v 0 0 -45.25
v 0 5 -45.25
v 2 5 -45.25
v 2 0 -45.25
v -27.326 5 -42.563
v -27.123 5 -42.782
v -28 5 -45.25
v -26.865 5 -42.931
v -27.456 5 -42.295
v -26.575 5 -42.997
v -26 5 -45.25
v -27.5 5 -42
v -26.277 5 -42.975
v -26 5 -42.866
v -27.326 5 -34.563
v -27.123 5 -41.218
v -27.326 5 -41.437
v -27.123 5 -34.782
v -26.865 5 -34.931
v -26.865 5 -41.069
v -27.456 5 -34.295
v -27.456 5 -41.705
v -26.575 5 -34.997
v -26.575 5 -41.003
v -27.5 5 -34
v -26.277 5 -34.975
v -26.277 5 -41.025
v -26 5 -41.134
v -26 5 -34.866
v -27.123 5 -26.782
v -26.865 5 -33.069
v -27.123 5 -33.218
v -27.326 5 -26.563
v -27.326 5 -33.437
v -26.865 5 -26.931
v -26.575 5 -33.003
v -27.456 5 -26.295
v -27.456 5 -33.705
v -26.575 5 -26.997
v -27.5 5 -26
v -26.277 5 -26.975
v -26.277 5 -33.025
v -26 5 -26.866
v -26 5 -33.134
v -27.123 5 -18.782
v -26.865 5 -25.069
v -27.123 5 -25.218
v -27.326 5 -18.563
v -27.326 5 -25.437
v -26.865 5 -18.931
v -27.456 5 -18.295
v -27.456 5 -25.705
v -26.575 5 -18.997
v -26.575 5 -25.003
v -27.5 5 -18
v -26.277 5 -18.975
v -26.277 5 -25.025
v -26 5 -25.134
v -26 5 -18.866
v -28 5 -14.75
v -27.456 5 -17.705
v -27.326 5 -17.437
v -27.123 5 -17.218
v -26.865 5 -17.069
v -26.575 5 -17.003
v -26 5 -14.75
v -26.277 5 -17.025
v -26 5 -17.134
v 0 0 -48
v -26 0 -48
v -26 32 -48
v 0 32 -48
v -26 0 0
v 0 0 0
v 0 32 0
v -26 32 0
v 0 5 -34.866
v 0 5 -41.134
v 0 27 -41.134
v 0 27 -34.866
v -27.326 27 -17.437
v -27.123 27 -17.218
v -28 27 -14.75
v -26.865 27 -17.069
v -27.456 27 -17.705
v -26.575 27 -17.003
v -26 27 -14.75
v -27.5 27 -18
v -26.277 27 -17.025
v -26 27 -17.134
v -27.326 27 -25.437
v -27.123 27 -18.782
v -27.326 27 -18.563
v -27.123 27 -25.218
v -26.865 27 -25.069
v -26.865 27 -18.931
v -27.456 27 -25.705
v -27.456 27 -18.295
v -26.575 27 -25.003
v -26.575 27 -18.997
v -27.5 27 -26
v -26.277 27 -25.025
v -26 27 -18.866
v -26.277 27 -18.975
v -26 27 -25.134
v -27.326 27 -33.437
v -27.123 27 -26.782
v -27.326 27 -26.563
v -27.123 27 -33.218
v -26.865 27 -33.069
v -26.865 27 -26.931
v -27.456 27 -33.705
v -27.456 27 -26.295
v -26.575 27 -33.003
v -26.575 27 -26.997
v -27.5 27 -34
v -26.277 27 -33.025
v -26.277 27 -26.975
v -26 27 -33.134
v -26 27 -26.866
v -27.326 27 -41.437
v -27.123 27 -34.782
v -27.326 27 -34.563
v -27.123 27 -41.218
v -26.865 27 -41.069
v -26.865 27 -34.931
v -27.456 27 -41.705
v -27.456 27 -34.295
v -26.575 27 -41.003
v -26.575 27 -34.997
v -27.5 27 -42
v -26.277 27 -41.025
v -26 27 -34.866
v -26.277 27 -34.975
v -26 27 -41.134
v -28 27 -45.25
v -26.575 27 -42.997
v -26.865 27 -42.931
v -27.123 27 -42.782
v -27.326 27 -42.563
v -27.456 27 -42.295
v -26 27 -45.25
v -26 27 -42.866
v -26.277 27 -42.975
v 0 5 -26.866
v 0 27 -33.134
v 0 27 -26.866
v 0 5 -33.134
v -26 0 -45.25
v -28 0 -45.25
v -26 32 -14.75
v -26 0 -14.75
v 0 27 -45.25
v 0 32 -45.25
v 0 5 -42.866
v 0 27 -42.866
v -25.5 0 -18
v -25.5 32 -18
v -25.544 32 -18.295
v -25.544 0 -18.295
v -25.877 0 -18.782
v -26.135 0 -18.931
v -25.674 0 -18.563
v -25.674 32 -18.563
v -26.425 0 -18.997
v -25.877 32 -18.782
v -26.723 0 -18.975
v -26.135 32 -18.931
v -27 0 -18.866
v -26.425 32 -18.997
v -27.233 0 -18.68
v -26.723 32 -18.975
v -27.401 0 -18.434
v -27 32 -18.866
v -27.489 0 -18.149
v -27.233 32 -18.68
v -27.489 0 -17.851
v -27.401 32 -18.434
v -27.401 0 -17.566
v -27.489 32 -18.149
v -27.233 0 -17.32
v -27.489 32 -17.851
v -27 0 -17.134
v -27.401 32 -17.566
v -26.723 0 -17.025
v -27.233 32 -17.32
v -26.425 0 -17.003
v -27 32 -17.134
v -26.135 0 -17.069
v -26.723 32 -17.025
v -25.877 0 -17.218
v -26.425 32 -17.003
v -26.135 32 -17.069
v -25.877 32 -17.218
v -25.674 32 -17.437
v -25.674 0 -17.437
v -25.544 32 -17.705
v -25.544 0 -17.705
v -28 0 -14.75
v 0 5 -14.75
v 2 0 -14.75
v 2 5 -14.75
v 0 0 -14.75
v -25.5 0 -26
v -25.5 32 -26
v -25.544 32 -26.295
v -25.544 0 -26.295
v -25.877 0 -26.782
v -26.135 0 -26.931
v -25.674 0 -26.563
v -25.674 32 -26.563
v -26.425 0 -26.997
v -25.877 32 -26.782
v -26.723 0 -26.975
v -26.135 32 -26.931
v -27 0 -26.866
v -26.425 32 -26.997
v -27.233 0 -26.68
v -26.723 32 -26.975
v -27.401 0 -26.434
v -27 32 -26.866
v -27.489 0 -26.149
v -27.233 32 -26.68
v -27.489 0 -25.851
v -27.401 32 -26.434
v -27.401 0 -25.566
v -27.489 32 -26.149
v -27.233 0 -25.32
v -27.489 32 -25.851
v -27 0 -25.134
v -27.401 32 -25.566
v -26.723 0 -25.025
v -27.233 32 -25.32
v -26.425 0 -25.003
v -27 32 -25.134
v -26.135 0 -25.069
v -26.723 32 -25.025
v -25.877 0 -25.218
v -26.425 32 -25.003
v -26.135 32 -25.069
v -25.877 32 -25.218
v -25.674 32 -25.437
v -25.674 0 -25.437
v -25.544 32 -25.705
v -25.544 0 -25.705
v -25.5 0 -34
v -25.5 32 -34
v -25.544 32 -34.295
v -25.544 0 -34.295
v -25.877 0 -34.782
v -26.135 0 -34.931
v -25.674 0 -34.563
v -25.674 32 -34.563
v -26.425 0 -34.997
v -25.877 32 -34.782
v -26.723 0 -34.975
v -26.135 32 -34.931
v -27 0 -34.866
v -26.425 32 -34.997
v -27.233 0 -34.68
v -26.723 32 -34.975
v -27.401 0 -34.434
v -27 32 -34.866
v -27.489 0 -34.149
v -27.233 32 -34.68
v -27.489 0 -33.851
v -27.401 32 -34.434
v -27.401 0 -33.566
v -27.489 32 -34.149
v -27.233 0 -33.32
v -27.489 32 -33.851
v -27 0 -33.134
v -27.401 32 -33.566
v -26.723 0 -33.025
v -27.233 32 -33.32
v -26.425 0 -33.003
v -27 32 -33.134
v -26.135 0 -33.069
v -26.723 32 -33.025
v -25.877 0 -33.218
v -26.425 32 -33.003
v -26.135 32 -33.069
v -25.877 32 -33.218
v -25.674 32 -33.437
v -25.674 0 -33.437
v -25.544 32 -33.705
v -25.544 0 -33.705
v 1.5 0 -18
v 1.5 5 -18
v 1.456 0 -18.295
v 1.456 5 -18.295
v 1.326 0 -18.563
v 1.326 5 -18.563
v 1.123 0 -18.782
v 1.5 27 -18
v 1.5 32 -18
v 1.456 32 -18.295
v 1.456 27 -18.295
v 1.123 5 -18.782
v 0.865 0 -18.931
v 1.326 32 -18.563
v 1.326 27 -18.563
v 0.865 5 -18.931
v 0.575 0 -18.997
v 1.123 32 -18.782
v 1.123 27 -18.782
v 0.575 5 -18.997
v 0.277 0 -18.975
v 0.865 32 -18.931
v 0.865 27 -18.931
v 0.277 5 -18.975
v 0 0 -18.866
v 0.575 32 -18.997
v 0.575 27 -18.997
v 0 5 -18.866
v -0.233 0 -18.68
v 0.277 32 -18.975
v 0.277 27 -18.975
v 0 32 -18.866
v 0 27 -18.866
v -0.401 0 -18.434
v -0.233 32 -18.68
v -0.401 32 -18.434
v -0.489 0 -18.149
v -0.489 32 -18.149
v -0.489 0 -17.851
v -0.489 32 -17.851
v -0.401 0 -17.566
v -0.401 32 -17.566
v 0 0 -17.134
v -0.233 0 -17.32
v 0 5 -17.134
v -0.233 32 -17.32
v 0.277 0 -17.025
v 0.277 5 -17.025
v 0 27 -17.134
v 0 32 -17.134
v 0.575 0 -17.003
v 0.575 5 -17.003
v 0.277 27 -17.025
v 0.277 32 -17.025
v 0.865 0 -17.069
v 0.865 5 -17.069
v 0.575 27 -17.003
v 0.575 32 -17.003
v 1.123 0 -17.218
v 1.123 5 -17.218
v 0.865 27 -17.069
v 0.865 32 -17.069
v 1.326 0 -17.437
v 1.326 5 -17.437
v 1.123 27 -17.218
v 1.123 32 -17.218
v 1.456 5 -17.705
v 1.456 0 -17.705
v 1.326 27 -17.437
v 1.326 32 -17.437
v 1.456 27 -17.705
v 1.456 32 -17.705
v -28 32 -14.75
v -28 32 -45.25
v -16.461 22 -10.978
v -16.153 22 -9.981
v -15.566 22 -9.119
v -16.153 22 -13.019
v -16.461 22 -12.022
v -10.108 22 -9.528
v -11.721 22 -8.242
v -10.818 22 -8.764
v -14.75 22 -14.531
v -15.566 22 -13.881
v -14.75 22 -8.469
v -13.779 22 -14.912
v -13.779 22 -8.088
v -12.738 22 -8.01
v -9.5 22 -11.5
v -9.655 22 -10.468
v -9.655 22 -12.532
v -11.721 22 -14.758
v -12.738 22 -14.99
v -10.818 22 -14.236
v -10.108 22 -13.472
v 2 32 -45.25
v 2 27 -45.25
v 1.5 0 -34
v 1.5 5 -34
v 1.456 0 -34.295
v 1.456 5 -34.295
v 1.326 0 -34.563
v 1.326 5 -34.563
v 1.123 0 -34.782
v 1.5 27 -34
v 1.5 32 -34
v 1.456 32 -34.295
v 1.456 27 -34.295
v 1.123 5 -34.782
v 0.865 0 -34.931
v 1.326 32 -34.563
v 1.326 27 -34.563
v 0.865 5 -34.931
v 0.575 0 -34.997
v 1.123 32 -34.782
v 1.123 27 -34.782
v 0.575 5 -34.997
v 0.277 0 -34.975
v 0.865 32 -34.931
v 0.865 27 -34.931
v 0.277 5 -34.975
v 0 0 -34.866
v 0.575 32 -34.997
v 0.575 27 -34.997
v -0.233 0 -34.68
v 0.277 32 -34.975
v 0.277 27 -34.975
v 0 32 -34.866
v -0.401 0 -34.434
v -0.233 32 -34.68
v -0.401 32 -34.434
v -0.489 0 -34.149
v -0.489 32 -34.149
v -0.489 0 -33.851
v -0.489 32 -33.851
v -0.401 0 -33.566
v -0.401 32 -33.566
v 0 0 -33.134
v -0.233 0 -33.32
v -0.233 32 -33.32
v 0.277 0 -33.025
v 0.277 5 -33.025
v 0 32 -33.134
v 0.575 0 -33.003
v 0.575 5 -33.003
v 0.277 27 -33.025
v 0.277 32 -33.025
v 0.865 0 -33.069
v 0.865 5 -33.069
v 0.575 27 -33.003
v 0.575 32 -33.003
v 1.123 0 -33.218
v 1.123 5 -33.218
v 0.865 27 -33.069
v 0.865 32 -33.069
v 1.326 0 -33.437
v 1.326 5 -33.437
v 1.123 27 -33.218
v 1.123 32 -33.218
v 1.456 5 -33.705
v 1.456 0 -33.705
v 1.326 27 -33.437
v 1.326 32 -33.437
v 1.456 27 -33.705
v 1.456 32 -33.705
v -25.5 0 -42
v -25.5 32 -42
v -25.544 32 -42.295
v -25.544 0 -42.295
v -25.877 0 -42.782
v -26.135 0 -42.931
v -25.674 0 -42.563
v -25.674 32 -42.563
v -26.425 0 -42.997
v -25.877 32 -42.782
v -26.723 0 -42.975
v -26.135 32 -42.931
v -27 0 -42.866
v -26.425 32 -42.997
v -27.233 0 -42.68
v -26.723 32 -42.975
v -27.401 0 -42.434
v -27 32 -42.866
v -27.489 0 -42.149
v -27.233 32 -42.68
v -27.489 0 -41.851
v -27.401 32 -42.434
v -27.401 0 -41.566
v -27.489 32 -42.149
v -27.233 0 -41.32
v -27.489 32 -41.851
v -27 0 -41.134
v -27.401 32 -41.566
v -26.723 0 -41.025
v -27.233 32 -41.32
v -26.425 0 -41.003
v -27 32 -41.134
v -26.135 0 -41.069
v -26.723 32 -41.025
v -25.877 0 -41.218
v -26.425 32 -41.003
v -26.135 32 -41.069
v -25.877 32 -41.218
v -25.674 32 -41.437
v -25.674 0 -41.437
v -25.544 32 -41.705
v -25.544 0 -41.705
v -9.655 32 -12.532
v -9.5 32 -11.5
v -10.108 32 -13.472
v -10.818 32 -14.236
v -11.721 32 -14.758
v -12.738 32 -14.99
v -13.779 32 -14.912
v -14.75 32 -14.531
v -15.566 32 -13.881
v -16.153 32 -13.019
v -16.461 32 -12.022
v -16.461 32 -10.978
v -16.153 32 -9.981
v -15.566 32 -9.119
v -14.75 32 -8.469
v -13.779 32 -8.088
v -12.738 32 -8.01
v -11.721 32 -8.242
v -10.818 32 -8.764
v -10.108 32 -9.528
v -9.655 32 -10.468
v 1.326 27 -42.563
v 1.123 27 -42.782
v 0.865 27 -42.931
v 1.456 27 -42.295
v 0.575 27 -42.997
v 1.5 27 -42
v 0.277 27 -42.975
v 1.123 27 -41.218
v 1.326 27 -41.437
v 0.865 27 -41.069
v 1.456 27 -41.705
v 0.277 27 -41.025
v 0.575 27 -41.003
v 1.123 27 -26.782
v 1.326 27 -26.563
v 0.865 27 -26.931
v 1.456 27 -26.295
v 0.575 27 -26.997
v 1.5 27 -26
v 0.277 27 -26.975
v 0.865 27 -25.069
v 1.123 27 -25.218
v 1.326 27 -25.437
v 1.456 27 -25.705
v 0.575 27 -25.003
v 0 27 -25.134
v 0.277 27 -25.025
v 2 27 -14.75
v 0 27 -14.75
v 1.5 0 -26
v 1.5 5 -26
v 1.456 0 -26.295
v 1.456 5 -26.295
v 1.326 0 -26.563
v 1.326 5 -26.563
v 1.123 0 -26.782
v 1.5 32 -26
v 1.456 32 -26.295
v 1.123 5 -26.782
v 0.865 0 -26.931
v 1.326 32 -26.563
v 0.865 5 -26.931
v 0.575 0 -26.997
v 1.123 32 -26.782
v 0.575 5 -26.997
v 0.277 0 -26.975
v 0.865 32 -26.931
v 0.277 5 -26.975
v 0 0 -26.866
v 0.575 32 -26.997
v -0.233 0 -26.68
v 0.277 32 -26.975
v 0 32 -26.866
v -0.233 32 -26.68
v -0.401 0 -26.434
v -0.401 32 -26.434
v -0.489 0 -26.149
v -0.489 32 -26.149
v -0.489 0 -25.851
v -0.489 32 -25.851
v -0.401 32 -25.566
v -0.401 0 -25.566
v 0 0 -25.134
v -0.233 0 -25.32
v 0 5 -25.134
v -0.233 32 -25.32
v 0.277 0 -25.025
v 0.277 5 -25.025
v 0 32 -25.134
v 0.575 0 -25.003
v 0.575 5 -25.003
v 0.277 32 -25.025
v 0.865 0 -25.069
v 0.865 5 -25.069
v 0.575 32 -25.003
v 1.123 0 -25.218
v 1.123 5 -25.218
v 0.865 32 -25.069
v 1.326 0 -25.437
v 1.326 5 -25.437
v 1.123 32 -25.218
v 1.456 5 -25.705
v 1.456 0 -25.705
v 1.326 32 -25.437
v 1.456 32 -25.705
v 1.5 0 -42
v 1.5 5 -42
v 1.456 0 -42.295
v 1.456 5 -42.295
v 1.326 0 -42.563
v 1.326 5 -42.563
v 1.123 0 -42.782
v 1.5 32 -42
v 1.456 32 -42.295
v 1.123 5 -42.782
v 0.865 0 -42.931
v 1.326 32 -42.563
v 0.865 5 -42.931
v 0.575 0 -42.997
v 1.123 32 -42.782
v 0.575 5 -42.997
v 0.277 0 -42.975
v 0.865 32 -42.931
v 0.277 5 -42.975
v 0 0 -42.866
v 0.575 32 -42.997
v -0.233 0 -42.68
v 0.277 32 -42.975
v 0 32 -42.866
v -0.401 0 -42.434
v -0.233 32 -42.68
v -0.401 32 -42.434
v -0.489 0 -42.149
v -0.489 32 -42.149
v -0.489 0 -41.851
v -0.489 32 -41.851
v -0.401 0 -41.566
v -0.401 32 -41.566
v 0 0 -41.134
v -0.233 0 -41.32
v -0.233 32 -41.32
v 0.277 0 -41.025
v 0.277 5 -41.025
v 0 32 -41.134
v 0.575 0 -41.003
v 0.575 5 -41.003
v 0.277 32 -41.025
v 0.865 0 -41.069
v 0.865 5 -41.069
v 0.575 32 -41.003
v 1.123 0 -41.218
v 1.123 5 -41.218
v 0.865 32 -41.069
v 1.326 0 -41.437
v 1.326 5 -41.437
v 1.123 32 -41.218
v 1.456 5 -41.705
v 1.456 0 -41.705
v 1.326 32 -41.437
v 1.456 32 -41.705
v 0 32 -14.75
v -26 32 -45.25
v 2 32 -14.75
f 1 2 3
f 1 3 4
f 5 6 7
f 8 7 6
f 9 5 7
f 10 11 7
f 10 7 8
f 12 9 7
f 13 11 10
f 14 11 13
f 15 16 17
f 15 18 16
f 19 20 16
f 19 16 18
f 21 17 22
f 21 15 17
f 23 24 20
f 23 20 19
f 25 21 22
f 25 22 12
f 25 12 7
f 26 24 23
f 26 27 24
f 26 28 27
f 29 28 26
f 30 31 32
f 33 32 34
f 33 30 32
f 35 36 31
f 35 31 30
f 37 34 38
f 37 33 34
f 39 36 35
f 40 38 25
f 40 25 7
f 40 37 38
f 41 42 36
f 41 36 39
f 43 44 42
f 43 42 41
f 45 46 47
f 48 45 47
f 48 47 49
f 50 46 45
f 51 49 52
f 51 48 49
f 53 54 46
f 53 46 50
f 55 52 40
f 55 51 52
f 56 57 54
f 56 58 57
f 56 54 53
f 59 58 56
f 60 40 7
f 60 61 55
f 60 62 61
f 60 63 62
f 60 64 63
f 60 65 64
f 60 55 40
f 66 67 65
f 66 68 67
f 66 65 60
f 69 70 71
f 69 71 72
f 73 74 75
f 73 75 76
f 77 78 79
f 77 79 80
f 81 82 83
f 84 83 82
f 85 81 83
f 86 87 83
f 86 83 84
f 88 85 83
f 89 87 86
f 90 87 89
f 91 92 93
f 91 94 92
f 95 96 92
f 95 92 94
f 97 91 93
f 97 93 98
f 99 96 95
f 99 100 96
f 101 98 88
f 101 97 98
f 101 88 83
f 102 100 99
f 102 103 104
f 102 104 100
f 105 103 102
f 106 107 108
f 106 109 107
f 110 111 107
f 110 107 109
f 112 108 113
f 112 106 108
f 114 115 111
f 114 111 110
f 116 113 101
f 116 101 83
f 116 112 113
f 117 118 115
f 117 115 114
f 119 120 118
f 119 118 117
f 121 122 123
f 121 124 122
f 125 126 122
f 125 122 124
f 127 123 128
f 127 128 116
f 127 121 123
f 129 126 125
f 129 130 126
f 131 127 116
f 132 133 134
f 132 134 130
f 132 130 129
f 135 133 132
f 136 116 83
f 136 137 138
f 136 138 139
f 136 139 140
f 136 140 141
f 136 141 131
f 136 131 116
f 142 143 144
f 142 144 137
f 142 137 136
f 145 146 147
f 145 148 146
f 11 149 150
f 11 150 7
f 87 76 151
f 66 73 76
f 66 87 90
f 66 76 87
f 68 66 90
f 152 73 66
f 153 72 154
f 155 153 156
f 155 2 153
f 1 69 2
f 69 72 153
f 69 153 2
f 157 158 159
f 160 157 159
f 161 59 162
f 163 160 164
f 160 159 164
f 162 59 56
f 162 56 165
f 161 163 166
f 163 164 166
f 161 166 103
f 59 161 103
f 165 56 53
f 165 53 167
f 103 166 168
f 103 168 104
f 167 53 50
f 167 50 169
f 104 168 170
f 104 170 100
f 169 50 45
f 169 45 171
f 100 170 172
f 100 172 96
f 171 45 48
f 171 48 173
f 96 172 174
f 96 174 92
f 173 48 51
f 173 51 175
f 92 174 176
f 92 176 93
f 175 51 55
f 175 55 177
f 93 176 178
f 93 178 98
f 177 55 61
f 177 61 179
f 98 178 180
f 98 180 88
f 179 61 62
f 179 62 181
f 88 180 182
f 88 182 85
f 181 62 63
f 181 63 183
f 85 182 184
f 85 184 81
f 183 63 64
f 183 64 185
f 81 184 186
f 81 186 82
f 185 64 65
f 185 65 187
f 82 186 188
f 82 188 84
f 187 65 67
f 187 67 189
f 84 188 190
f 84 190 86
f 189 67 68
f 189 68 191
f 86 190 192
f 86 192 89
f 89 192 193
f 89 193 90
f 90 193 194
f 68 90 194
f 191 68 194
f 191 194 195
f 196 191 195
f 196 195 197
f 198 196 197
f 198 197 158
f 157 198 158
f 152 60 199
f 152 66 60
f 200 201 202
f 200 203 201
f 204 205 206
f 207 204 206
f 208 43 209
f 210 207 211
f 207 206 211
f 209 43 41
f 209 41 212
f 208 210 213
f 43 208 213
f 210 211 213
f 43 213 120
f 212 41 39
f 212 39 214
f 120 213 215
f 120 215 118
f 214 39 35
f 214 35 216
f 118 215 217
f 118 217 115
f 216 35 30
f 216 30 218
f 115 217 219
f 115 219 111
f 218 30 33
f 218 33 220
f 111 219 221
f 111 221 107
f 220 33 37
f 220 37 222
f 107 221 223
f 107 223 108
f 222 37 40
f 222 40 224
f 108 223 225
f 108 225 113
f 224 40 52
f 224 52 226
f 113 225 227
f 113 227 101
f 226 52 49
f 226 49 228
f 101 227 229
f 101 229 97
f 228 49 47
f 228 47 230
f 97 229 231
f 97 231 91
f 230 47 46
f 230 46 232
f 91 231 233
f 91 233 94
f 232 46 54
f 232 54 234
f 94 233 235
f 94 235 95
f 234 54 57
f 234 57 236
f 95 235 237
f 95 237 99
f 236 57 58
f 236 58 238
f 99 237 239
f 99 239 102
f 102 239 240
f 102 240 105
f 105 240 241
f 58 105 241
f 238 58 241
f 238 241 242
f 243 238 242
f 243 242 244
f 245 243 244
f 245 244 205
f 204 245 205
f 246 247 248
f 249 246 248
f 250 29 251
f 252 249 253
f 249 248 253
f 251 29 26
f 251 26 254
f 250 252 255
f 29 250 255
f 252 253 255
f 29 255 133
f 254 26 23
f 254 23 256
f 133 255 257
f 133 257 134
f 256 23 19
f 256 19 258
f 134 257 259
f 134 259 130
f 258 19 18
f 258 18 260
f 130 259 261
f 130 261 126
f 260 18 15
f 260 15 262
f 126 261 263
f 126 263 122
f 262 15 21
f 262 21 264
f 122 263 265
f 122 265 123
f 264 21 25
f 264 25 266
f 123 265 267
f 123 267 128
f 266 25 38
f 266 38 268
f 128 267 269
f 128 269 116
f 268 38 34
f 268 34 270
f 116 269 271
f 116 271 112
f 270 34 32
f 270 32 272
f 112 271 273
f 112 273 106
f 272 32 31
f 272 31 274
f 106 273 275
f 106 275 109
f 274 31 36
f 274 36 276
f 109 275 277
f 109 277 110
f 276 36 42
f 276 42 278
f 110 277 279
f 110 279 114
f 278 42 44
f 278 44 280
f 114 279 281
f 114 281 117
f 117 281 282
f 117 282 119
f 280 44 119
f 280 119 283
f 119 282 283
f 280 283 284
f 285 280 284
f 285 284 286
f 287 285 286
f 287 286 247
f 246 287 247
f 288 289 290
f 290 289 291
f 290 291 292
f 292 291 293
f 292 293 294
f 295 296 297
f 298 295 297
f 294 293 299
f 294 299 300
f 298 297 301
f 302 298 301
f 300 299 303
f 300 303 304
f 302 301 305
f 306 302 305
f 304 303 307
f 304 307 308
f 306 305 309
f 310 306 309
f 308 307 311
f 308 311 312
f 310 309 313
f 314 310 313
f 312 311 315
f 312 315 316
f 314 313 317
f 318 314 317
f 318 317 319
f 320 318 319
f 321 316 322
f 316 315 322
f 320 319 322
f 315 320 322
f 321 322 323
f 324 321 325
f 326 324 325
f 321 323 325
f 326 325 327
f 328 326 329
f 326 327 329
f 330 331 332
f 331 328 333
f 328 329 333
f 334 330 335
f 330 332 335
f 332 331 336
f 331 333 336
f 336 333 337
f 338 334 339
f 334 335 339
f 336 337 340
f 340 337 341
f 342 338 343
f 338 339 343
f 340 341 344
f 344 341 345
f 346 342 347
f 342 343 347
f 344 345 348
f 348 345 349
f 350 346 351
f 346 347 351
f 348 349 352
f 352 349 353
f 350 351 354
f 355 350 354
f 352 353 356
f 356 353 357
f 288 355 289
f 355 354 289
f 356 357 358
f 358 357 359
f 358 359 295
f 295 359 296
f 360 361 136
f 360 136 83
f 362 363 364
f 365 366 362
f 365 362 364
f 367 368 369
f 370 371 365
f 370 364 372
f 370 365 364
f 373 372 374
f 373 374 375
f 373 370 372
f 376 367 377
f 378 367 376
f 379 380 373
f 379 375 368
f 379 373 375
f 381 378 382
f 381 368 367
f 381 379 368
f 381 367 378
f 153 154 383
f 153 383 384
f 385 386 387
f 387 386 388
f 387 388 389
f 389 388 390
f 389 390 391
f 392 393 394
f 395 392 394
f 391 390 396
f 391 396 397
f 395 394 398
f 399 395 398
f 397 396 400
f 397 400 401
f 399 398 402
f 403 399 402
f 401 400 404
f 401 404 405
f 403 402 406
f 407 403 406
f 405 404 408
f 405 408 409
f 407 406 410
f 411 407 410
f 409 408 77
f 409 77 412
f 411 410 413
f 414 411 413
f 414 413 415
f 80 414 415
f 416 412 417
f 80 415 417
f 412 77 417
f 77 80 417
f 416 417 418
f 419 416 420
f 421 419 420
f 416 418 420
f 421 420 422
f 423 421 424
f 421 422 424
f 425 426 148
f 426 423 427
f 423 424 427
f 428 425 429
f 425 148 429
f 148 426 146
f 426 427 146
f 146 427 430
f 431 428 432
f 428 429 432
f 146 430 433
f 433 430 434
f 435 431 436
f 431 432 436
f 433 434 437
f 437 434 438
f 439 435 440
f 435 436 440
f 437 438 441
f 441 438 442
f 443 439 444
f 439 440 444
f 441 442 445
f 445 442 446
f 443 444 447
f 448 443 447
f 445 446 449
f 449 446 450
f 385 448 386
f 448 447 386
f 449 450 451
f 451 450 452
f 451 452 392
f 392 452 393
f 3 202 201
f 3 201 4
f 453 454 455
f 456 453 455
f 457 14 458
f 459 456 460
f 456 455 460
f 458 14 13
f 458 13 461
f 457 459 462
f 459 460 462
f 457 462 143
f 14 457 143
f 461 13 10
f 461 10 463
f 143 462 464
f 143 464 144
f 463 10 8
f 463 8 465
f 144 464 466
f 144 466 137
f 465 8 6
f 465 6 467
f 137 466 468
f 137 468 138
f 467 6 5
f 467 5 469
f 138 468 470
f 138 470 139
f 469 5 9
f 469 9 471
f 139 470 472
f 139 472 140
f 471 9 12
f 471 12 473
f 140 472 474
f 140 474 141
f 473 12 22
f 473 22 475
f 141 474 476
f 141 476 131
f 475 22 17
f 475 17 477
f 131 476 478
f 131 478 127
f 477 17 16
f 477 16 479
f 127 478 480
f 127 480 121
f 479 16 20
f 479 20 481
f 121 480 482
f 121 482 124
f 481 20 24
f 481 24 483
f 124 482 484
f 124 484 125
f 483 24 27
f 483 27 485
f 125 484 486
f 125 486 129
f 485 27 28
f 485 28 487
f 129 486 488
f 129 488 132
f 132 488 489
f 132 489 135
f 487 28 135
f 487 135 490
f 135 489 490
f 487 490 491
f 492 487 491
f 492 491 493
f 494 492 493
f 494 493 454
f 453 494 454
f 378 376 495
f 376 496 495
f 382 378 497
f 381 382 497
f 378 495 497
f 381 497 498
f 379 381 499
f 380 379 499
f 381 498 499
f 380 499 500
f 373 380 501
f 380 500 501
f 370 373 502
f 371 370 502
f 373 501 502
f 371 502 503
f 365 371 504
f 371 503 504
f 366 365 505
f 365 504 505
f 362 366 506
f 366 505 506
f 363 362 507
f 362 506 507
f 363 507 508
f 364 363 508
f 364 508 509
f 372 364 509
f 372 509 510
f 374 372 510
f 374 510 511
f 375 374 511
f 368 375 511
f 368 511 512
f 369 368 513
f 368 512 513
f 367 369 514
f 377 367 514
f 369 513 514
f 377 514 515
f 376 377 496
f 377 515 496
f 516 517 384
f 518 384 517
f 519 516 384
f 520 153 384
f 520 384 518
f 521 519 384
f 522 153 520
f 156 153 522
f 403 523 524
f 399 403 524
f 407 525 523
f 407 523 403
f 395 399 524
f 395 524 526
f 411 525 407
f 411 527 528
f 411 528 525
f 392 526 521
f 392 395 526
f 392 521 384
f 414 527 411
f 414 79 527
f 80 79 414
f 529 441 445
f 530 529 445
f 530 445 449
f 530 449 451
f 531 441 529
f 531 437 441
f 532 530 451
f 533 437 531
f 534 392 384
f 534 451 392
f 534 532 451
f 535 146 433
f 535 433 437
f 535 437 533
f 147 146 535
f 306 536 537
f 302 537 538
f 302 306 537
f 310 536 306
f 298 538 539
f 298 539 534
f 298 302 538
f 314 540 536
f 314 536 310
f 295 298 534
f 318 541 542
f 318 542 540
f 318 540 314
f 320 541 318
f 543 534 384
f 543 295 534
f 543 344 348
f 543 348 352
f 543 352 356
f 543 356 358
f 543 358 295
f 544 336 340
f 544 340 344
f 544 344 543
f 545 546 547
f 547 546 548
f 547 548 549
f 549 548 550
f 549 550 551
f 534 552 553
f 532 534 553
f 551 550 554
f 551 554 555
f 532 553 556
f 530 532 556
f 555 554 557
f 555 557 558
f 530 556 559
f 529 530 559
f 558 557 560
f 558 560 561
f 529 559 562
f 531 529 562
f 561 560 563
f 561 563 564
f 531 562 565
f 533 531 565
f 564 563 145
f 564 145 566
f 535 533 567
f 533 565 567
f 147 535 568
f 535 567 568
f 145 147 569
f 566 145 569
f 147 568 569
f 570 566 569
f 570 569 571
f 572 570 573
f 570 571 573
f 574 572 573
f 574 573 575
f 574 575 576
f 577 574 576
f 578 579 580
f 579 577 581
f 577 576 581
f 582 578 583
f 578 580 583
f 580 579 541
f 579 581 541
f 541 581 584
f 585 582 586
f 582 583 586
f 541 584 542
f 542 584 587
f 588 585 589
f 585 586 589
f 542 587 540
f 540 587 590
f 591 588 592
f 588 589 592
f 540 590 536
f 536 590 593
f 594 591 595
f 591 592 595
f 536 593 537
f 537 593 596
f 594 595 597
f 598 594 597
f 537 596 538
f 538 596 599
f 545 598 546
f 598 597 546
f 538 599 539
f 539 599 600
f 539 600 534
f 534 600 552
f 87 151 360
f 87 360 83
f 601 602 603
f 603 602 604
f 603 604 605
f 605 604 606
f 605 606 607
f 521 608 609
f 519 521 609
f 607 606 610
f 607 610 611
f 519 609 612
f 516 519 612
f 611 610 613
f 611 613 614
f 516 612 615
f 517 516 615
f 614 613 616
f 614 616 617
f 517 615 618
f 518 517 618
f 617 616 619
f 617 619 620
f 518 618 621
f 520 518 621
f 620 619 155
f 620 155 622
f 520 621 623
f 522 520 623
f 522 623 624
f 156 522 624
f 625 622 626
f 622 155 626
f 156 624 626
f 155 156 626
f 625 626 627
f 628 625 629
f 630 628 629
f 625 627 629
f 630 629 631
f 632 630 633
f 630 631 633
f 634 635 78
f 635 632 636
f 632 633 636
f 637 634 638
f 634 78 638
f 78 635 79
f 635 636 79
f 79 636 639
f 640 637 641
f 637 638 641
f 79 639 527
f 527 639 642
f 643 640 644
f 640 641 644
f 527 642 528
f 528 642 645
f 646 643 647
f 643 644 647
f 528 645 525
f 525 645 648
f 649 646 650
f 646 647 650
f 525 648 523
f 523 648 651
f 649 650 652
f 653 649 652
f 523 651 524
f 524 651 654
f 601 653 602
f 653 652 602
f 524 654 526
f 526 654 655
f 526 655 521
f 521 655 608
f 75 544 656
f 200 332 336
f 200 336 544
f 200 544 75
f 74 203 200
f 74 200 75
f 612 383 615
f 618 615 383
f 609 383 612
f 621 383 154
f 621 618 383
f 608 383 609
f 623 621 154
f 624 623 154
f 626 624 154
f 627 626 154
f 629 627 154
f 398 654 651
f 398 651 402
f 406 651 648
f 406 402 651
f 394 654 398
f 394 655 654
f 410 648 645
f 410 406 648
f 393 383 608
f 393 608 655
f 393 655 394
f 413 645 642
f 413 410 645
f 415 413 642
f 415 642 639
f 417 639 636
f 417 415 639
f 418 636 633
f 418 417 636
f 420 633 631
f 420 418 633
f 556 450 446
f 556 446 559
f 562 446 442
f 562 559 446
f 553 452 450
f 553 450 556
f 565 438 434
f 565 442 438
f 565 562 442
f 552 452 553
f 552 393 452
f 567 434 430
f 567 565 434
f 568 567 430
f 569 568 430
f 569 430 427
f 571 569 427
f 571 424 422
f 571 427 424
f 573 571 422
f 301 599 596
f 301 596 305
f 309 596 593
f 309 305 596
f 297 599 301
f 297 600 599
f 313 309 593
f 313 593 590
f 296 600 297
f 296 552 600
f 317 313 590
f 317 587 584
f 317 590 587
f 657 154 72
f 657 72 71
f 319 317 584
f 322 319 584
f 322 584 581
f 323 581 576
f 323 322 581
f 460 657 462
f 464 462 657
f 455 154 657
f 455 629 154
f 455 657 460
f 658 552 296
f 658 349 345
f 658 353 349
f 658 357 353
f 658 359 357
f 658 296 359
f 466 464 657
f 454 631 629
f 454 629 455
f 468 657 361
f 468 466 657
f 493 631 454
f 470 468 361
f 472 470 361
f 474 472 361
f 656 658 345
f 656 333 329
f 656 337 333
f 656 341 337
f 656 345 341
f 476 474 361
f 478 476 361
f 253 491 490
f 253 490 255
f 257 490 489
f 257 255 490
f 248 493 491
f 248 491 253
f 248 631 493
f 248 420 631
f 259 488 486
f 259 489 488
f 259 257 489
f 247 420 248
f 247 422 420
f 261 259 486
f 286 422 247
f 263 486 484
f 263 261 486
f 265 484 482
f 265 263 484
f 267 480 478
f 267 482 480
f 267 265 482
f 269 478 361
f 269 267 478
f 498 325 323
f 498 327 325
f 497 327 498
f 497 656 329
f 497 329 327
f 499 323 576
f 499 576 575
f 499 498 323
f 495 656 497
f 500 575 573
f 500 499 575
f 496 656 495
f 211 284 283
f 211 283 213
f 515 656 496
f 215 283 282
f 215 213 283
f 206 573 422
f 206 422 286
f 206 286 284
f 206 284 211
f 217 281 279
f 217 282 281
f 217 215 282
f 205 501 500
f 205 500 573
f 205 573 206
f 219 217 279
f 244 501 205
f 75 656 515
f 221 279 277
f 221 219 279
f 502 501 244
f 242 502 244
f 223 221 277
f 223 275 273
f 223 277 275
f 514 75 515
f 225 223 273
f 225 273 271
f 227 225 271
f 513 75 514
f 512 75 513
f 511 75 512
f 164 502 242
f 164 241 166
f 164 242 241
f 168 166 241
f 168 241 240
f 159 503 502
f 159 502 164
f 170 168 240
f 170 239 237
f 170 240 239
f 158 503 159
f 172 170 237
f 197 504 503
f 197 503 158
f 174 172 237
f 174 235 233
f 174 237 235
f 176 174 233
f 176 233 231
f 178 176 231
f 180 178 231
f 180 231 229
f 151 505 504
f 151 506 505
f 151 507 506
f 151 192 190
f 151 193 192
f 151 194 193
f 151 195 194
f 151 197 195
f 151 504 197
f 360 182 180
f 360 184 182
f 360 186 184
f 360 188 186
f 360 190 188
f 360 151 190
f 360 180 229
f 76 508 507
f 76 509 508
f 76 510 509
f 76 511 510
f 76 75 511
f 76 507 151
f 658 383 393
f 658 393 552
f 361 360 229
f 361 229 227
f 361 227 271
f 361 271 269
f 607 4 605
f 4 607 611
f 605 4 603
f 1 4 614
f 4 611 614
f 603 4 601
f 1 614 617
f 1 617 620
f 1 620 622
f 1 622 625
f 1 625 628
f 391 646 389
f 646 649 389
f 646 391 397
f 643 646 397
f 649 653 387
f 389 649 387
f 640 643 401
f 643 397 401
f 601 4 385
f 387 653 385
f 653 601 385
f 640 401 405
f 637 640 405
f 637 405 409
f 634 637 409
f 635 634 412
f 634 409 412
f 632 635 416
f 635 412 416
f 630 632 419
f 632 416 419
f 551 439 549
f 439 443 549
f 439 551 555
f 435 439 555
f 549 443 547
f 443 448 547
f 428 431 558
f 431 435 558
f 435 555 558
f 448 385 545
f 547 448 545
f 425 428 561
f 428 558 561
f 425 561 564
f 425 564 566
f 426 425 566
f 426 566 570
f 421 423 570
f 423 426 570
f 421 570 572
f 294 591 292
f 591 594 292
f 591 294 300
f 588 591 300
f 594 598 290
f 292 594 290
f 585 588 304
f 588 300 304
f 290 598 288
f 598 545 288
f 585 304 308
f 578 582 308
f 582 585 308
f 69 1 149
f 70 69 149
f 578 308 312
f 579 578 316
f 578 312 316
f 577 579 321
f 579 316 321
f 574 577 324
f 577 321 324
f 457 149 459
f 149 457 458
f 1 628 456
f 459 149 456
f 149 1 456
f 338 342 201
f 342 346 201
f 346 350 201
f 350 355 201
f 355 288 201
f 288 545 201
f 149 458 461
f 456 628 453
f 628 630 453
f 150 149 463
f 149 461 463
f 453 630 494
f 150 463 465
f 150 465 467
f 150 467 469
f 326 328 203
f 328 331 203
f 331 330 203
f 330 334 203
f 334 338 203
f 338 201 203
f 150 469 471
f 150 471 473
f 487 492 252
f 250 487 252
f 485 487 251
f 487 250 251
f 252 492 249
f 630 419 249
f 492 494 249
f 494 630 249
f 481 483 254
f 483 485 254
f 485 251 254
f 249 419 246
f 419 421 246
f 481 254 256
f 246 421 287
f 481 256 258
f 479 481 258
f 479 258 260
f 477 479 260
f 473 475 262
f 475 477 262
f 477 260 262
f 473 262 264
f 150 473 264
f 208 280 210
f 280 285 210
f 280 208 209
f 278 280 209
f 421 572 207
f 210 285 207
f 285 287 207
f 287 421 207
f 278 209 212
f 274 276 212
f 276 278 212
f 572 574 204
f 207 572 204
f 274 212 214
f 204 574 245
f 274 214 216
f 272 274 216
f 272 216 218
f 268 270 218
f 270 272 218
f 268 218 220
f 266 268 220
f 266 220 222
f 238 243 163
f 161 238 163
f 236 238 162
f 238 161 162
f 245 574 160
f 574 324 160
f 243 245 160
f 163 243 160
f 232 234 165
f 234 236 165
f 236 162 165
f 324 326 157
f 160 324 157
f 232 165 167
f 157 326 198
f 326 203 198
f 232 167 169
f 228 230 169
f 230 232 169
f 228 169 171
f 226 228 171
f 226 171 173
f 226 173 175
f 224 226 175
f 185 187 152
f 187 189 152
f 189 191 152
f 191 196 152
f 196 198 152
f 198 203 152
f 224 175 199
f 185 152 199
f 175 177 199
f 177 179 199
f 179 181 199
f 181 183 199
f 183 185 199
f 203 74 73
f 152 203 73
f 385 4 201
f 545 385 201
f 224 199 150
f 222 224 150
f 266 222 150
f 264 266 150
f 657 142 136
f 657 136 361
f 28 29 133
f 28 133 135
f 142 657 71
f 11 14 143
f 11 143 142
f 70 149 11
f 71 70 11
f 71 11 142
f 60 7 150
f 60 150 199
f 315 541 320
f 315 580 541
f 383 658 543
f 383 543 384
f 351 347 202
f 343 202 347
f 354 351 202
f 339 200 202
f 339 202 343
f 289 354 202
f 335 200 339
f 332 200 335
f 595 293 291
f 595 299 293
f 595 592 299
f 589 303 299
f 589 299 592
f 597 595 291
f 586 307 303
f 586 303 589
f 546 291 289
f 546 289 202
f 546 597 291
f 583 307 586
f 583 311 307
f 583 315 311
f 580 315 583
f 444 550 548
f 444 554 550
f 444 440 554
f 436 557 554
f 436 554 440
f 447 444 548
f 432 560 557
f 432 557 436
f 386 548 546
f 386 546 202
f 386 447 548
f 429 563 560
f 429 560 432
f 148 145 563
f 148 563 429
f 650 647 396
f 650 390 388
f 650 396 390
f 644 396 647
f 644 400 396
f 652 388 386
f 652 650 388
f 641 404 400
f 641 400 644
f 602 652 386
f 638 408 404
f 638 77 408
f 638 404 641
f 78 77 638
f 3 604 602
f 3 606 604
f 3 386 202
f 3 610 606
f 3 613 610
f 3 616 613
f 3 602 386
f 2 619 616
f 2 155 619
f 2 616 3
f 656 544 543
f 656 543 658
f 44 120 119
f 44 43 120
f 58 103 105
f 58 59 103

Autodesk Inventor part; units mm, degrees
ref_plane "YZ Plane" through (0, 0, 0) normal (1, 0, 0) x (0, 1, 0)
ref_plane "XZ Plane" through (0, 0, 0) normal (0, 1, 0) x (-1, 0, 0)
ref_plane "XY Plane" through (0, 0, 0) normal (0, 0, 1) x (1, 0, 0)
sketch "Sketch1" plane through (0, 0, 0) normal (0, 1, 0) x (-1, 0, 0)
  line L0 (0, 0) -> (26, 0)
  line L1 (26, 0) -> (26, -48)
  line L2 (26, -48) -> (0, -48)
  line L3 (0, -48) -> (0, 0)
  dimension "d0" = 26
  dimension "d1" = 48
extrude "Extrusion1" add sketch "Sketch1" along normal blind 32
sketch "Sketch2" plane through (0, 32, 0) normal (0, 1, 0) x (1, 0, 0)
  circle A0 centre (-13, 11.5) radius 3.5
  line L0 (0, 0) -> (-26, 0) projected
  line L1 (0, 0) -> (0, 48) projected
  dimension "d4" = 7
  dimension "d5" = 11.5
  dimension "d6" = 26
  dimension "d7" = 13
extrude "Extrusion2" cut sketch "Sketch2" against normal blind 10
sketch "Sketch3" plane through (0, 0, 0) normal (1, 0, 0) x (0, 0, -1)
  line L0 (0, 32) -> (48, 32) projected
  line L1 (14.75, 32) -> (45.25, 32)
  line L2 (45.25, 32) -> (45.25, 27)
  line L3 (45.25, 27) -> (14.75, 27)
  line L4 (14.75, 27) -> (14.75, 32)
  line L5 (48, 0) -> (0, 0) projected
  line L6 (45.25, 0) -> (14.75, 0)
  line L7 (14.75, 0) -> (14.75, 5)
  line L8 (14.75, 5) -> (45.25, 5)
  line L9 (45.25, 5) -> (45.25, 0)
  line L10 (0, 0) -> (0, 32) projected
  line L11 (48, 0) -> (48, 32) projected
  dimension "d10" = 5
  dimension "d11" = 5
  dimension "d12" = 30.5
  dimension "d13" = 30.5
  dimension "d52" = 14.75
extrude "Extrusion3" add sketch "Sketch3" along normal blind 2 contours L0 L2 L3 L4 | L7 L8 L9 L5
sketch "Sketch4" plane through (-26, 0, -48) normal (-1, 0, 0) x (0, 0, 1)
  line L0 (2.75, 27) -> (2.75, 32) projected
  line L1 (2.75, 32) -> (33.25, 32) projected
  line L2 (33.25, 32) -> (33.25, 27) projected
  line L3 (33.25, 27) -> (2.75, 27) projected
  line L4 (2.75, 27) -> (2.75, 32) projected
  line L5 (33.25, 0) -> (2.75, 0) projected
  line L6 (2.75, 0) -> (2.75, 5) projected
  line L7 (2.75, 5) -> (33.25, 5) projected
  line L8 (33.25, 5) -> (33.25, 0) projected
  point P0 (48, 0)
extrude "Extrusion4" add sketch "Sketch4" along normal blind 2
sketch "Sketch5" plane through (0, 32, 0) normal (0, 1, 0) x (1, 0, 0)
  circle A0 centre (0.5, 42) radius 1
  line L0 (0, 45.25) -> (2, 45.25) projected
  line L1 (2, 45.25) -> (2, 14.75) projected
  circle A1 centre (-13, 11.5) radius 3.5 projected
  line L2 (-26, 0) -> (0, 0) projected
  line L3 (0, 0) -> (0, 14.75) projected
  line L4 (0, 14.75) -> (2, 14.75) projected
  line L5 (2, 45.25) -> (2, 14.75) projected
  line L6 (0, 45.25) -> (2, 45.25) projected
  line L7 (0, 48) -> (-26, 48) projected
  line L8 (-26, 48) -> (-26, 45.25) projected
  line L9 (-26, 45.25) -> (-28, 45.25) projected
  line L10 (-28, 14.75) -> (-28, 45.25) projected
  line L11 (-26, 14.75) -> (-28, 14.75) projected
  circle A2 centre (0.5, 34) radius 1
  circle A3 centre (0.5, 26) radius 1
  circle A4 centre (0.5, 18) radius 1
  circle A5 centre (-26.5, 42) radius 1
  circle A6 centre (-26.5, 34) radius 1
  circle A7 centre (-26.5, 26) radius 1
  circle A8 centre (-26.5, 18) radius 1
  line L12 (0, 45.25) -> (0, 48) projected
  line L13 (-26, 14.75) -> (-26, 0) projected
  point P0 (0, 48.5)
  dimension "d20" = 2
  dimension "d21" = 3.25
  dimension "d24" = 8
  dimension "d29" = 3.25
  dimension "d30" = 1.5
  dimension "d32" = 2
  dimension "d33" = 1.5
  dimension "d36" = 8
  dimension "d41" = 3.25
  dimension "d42" = 3.25
extrude "Extrusion5" cut sketch "Sketch5" against normal through all contours A0 | A2 | A3 | A4 | A5 | A6 | A7 | A8
equation "\"d7\" = 0.5 * d6"
equation "\"d10\" = d11"
equation "\"d21\" = d29"
equation "\"d41\" = d42"
properties part number "ax12" material "ABS Plastic"
